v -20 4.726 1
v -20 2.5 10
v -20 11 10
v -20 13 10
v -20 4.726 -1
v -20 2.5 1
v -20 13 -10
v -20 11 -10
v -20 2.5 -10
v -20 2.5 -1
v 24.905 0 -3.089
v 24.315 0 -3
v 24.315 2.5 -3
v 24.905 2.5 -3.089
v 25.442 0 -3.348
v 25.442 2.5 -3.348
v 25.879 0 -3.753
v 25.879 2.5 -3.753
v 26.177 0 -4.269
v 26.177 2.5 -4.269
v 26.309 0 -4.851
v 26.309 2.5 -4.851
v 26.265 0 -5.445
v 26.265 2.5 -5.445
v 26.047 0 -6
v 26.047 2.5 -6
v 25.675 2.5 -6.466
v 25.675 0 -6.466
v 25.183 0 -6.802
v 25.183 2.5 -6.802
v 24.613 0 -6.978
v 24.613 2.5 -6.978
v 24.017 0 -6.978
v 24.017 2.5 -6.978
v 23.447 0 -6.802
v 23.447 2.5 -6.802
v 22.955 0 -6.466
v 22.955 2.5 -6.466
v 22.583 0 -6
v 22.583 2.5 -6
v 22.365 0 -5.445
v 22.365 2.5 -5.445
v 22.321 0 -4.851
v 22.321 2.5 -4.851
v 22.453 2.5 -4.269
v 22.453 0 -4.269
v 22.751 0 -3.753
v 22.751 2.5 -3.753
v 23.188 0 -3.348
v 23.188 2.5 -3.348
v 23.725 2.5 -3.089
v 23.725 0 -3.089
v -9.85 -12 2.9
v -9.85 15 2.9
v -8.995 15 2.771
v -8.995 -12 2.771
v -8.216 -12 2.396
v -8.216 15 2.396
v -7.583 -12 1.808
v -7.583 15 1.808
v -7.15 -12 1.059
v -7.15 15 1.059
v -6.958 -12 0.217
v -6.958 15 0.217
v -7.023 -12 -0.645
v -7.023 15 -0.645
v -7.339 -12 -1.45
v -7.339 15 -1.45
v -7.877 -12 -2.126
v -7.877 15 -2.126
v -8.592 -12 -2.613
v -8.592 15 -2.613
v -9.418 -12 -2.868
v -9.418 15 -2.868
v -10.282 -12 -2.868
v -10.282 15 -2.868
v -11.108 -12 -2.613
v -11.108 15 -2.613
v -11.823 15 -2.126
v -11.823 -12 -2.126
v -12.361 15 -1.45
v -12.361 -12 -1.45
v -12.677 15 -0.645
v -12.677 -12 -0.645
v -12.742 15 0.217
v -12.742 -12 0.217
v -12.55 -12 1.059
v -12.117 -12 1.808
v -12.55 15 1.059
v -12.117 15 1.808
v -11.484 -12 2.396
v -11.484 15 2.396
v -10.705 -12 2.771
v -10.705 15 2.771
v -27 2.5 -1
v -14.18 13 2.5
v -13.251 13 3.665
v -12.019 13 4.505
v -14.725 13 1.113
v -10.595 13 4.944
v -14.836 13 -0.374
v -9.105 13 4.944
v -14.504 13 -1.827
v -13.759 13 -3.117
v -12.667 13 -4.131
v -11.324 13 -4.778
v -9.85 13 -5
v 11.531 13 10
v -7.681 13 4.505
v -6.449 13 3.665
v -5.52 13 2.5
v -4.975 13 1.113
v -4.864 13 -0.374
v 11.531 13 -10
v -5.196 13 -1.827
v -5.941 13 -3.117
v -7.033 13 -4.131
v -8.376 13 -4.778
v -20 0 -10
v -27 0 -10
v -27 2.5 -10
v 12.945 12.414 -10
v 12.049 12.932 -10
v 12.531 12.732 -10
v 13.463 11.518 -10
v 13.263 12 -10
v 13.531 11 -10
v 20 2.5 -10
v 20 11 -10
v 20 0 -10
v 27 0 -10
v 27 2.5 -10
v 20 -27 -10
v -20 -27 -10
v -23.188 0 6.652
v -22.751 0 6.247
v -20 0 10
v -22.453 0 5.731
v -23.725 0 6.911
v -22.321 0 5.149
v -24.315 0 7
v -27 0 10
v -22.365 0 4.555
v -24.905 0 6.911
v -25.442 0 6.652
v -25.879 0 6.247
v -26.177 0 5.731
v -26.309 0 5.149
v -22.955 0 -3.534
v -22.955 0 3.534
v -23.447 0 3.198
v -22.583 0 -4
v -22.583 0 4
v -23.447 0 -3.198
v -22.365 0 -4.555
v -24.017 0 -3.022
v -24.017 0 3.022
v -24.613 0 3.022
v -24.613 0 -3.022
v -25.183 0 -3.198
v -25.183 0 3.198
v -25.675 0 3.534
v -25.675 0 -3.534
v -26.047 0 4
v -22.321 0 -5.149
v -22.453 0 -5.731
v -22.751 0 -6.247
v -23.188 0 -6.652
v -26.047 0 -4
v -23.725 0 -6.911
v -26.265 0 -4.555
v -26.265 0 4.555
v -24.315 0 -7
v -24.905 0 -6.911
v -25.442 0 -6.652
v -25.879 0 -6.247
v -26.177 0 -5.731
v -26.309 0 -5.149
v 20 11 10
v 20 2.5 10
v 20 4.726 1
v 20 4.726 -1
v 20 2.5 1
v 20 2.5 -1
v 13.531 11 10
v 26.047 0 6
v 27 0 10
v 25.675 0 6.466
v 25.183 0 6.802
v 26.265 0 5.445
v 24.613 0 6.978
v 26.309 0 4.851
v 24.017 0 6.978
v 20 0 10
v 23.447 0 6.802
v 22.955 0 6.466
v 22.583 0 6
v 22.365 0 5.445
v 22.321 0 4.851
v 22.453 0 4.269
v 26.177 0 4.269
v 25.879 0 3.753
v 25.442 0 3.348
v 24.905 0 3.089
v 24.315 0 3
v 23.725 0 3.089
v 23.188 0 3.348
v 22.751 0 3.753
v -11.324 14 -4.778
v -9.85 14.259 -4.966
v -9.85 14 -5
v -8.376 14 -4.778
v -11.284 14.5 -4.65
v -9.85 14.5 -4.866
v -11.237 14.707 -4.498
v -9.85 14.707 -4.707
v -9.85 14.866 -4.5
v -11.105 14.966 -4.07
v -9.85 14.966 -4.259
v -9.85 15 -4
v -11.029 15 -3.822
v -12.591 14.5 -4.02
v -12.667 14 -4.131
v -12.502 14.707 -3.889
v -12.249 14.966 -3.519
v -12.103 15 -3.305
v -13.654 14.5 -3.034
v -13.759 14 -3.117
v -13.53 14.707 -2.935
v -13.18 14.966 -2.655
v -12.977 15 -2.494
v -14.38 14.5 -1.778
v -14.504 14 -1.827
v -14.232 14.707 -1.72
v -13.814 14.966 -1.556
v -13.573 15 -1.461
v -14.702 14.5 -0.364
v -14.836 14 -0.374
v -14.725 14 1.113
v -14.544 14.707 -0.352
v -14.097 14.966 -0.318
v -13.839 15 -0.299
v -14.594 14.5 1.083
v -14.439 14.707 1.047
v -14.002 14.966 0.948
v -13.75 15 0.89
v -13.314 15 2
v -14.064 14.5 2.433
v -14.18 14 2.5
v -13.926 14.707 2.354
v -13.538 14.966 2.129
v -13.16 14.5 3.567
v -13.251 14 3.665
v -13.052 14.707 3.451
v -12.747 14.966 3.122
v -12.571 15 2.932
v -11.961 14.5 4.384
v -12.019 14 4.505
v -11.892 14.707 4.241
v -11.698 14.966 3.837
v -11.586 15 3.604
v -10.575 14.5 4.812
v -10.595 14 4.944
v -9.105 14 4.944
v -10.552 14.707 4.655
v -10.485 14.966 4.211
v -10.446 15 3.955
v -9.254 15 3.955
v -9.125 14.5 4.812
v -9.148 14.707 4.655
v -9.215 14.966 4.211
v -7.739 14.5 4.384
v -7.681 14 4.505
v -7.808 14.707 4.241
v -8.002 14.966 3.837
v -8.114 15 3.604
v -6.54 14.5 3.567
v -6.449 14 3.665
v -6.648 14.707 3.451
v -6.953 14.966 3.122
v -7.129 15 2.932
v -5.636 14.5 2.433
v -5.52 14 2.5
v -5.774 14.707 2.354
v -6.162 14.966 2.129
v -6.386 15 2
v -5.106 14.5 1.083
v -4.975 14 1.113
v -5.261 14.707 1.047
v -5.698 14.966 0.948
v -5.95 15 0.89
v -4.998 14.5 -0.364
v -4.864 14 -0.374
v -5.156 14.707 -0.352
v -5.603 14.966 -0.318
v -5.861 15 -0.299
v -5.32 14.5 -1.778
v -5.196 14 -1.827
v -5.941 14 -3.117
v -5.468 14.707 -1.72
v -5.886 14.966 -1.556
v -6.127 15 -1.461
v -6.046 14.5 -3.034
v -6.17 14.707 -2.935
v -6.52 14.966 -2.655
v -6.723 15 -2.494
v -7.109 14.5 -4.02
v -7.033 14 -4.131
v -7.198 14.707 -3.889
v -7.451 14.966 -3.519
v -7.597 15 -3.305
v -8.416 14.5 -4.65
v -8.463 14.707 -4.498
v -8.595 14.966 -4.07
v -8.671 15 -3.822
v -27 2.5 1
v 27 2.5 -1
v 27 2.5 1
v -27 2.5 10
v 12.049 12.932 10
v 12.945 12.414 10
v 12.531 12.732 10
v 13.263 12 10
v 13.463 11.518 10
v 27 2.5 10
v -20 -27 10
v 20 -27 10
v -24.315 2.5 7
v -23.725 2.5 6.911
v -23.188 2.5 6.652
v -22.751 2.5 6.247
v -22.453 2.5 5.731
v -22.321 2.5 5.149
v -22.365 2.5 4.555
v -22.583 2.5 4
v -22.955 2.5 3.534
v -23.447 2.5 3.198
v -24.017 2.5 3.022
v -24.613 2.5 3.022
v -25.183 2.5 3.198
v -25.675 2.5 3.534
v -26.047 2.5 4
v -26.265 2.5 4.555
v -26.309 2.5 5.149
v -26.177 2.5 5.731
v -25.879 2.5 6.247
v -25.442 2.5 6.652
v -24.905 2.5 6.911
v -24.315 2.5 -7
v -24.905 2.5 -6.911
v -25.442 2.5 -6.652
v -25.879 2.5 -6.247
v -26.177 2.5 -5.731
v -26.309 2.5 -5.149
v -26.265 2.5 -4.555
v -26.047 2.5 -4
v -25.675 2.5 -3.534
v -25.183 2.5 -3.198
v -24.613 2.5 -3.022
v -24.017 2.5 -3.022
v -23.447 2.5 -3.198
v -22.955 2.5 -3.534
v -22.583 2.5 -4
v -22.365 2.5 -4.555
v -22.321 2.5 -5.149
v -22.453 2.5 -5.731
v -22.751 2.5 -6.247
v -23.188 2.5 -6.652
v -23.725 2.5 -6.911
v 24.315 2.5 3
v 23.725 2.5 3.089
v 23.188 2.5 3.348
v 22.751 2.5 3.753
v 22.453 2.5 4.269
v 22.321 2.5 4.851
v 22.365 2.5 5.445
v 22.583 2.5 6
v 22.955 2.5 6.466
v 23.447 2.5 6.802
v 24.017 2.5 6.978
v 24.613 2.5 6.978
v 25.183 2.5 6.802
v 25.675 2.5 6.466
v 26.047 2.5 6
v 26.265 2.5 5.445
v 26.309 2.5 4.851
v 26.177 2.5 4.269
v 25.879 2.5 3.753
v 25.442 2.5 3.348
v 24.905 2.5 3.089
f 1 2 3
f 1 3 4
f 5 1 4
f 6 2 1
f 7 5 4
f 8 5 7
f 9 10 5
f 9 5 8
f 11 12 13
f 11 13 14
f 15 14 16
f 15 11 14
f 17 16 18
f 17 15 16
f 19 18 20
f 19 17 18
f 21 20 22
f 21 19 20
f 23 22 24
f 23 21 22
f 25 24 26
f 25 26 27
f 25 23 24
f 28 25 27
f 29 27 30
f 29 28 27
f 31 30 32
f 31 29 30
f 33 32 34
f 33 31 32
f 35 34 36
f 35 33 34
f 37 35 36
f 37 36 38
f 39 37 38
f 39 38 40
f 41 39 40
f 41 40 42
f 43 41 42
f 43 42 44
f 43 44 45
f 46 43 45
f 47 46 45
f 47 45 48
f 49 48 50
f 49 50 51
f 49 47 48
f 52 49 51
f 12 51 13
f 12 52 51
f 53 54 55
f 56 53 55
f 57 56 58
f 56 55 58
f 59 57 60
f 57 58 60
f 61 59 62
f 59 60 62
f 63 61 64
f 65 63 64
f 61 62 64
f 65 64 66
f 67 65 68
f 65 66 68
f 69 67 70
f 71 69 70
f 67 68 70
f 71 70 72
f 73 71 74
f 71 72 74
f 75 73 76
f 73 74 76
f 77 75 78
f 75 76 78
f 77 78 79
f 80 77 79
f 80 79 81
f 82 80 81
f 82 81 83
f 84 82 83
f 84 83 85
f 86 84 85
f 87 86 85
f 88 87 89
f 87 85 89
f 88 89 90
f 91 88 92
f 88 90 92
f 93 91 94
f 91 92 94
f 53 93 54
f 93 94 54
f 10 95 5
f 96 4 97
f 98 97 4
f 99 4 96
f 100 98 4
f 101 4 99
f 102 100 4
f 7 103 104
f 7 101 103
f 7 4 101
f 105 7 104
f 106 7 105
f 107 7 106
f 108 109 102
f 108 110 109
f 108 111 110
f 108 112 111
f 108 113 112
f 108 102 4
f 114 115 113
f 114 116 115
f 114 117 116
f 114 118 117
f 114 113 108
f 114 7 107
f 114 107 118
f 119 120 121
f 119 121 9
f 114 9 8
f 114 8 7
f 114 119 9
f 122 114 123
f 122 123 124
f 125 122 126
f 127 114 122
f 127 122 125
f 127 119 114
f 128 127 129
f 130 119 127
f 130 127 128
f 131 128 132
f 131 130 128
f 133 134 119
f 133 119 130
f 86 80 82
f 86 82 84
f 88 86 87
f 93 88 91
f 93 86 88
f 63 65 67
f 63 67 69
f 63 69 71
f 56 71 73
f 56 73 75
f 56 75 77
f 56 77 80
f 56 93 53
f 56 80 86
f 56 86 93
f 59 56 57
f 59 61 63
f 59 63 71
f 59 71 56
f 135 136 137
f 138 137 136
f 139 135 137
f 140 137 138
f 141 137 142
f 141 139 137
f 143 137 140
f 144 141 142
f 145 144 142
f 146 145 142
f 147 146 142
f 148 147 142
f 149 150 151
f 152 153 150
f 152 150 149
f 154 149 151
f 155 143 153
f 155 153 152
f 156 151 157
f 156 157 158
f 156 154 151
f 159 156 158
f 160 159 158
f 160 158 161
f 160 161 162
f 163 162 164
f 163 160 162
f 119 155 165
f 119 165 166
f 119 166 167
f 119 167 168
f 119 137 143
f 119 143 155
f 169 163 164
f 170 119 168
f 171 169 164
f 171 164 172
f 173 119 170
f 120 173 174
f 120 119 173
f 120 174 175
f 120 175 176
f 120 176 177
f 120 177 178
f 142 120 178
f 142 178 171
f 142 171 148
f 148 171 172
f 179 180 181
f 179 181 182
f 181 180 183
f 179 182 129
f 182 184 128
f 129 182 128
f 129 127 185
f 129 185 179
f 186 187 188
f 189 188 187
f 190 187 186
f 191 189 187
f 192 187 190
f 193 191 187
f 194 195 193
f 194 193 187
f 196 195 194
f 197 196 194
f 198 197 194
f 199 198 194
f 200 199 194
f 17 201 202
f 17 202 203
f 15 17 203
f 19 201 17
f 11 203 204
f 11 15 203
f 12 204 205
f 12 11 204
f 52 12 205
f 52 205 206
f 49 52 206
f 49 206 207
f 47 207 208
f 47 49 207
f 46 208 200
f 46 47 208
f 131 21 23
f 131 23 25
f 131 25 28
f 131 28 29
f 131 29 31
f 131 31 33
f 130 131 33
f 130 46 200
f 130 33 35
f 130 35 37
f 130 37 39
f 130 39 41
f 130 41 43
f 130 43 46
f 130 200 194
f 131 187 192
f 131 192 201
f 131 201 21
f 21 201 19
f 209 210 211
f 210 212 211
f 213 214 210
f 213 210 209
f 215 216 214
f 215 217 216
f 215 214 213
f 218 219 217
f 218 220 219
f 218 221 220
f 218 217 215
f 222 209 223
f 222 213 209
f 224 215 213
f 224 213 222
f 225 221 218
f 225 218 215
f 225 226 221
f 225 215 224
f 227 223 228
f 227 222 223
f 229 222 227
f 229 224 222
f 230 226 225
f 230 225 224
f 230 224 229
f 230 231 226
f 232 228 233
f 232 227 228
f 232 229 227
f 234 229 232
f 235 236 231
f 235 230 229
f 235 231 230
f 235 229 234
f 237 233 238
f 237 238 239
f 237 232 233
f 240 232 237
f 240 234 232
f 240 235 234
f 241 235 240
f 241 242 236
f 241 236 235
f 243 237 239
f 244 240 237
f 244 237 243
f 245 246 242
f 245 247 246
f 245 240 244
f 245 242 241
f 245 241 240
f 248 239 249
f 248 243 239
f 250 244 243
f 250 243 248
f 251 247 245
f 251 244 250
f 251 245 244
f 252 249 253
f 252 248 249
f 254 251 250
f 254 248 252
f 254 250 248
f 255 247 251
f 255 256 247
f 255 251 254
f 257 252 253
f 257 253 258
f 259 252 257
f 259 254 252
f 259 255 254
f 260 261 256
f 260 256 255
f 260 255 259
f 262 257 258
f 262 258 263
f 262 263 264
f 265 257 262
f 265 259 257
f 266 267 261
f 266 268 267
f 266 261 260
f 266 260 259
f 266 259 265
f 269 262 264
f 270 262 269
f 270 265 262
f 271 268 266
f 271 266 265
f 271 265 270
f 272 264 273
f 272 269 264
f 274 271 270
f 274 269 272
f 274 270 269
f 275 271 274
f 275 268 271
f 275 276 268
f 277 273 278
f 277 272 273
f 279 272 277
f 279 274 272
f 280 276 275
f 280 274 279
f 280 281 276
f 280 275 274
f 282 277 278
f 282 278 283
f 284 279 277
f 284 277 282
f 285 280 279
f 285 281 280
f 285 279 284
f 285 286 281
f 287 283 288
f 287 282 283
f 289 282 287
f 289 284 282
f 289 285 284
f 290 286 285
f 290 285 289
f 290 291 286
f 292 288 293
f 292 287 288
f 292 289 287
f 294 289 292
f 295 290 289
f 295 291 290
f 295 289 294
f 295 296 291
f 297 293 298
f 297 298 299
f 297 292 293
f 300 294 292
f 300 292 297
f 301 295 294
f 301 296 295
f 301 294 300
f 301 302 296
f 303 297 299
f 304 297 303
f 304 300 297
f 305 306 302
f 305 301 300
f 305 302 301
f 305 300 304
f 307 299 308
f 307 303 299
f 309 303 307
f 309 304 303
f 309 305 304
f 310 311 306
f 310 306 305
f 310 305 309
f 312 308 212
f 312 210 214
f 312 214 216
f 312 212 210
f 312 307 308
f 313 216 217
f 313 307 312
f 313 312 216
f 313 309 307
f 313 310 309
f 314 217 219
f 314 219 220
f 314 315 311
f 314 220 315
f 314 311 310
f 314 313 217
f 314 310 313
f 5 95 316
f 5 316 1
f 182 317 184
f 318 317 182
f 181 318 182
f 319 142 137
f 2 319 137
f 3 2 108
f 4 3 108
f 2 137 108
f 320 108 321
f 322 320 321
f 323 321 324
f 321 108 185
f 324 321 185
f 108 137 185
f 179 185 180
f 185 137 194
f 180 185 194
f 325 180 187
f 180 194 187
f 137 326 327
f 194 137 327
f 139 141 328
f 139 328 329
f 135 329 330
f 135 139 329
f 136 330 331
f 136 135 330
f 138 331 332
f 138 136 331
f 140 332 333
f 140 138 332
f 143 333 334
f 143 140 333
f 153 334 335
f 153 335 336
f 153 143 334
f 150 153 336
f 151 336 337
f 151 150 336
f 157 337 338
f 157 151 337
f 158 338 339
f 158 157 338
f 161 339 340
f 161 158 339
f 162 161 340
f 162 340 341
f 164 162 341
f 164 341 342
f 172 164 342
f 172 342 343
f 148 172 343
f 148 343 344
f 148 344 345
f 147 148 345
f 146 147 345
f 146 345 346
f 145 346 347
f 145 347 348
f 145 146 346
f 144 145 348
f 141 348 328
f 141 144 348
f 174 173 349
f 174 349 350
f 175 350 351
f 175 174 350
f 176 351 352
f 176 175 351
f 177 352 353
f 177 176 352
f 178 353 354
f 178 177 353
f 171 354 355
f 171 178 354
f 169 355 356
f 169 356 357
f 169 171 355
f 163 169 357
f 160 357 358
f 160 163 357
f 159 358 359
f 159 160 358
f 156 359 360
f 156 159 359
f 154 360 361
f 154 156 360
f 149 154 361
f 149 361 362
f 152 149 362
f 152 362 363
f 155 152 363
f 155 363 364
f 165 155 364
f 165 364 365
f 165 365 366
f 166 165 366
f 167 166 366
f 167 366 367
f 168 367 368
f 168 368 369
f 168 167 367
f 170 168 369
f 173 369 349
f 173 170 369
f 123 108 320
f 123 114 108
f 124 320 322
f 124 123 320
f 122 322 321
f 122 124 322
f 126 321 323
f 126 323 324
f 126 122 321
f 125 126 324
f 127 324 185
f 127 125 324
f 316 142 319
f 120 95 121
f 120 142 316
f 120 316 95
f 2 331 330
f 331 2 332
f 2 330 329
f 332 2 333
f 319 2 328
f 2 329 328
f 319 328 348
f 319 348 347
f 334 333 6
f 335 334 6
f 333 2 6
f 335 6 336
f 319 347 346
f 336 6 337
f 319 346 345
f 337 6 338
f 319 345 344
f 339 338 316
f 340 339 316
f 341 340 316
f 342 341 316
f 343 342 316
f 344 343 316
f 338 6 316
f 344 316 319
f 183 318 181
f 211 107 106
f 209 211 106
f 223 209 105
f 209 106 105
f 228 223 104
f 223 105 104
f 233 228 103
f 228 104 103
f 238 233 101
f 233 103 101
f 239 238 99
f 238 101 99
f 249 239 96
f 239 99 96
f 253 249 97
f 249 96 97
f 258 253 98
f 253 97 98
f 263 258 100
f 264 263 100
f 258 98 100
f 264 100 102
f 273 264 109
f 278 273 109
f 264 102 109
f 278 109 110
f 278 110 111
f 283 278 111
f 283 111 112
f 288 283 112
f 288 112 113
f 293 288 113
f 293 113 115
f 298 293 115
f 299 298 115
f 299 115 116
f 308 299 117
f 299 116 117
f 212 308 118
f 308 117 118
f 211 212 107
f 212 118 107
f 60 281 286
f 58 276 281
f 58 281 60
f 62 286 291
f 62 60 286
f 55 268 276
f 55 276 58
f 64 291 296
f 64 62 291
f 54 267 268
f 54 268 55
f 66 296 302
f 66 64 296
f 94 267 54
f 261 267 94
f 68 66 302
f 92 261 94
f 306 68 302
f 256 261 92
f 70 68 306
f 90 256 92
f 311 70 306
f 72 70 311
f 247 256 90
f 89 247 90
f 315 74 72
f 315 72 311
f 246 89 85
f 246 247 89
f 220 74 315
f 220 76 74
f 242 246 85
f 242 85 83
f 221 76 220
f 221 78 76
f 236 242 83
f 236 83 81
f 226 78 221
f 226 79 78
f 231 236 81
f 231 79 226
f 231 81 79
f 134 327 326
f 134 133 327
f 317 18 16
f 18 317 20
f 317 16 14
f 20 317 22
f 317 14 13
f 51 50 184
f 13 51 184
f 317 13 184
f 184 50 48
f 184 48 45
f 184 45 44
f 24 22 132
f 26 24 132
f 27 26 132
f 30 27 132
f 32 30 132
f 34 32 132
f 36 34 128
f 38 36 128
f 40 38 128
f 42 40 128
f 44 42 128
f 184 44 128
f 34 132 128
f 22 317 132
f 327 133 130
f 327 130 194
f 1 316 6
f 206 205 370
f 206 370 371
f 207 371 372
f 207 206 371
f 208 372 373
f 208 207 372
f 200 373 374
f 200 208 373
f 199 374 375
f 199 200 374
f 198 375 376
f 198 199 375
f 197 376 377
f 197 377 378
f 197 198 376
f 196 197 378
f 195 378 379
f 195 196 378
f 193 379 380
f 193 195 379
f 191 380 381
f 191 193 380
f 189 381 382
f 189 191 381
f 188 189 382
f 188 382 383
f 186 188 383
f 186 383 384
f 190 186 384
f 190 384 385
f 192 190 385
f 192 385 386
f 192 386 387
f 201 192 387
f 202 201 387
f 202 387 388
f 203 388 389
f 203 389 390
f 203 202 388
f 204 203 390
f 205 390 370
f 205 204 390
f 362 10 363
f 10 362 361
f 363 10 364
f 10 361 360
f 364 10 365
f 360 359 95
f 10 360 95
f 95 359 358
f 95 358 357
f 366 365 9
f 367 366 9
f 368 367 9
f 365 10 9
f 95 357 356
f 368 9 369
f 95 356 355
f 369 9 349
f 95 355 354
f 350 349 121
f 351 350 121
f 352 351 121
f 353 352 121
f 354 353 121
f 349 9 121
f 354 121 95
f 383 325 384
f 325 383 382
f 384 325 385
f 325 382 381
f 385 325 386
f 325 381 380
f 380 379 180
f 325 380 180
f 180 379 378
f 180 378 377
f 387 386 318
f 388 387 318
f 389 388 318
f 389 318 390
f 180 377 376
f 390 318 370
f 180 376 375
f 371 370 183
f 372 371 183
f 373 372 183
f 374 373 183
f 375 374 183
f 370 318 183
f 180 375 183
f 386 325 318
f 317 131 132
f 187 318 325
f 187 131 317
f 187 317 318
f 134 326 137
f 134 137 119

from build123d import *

# Parameters (mm, degrees)
EXTRUDE_1_DEPTH     = 27
SKETCH_3_R          = 2
EXTRUDE_2_DEPTH     = 2.5
EXTRUDE_3_DEPTH     = 8.5
SKETCH_5_W          = 33.531111889
SKETCH_5_H          = 20
EXTRUDE_4_DEPTH     = 2
FILLET_5_R          = 2
SKETCH_6_R          = 5
EXTRUDE_5_DEPTH     = 2
FILLET_7_R          = 1
SKETCH_7_R          = 2.9
CUT_EXTRUDE_1_DEPTH = 27
RIB_8_REACH         = 41.472
SKETCH_8_WALL_W     = 88.288518024
SKETCH_8_WALL_H     = 2


with BuildPart() as part:
    # 草图2 → 凸台-拉伸1 (new body)
    with BuildSketch(Plane(origin=(0, 0, 0), x_dir=(1, 0, 0), z_dir=(0, 1, 0))):
        Polygon((0, -10), (-20, -10), (-20, 10), (20, 10), (20, -10), align=None)
    extrude(amount=-EXTRUDE_1_DEPTH)

    # 草图3 → 凸台-拉伸2 (add)
    with BuildSketch(Plane(origin=(0, 0, 0), x_dir=(1, 0, 0), z_dir=(0, 1, 0))):
        Polygon((0, 10), (27, 10), (27, -10), (-27, -10), (-27, 10), align=None)
        with Locations(Location((-24.315, -5, 0), (0, 0, 270))):
            Circle(SKETCH_3_R, mode=Mode.SUBTRACT)
        with Locations(Location((-24.315, 5, 0), (0, 0, 90))):
            Circle(SKETCH_3_R, mode=Mode.SUBTRACT)
        with Locations(Location((24.315, -5, 0), (0, 0, 90))):
            Circle(SKETCH_3_R, mode=Mode.SUBTRACT)
        with Locations(Location((24.315, 5, 0), (0, 0, 270))):
            Circle(SKETCH_3_R, mode=Mode.SUBTRACT)
    extrude(amount=EXTRUDE_2_DEPTH)

    # 草图4 → 凸台-拉伸3 (add)
    with BuildSketch(Plane(origin=(0, 2.5, 0), x_dir=(1, 0, 0), z_dir=(0, 1, 0))):
        Polygon((0, 10), (-20, 10), (-20, -10), (20, -10), (20, 10), align=None)
    extrude(amount=EXTRUDE_3_DEPTH)

    # 草图5 → 凸台-拉伸4 (add)
    with BuildSketch(Plane(origin=(0, 11, 0), x_dir=(1, 0, 0), z_dir=(0, 1, 0))):
        with Locations((-3.234444055, 0)):
            Rectangle(SKETCH_5_W, SKETCH_5_H)
    extrude(amount=EXTRUDE_4_DEPTH)

    # 圆角5
    fillet_5_edges = [part.edges().sort_by_distance(p)[0] for p in [
        (13.531111889, 13, 0),
    ]]
    fillet(fillet_5_edges, radius=FILLET_5_R - 0.0001)  # a hair under: the kernel refuses the full size

    # 草图6 → 凸台-拉伸5 (add)
    with BuildSketch(Plane(origin=(0, 13, 0), x_dir=(1, 0, 0), z_dir=(0, 1, 0))):
        with Locations(Location((-9.85, 0, 0), (0, 0, 90))):
            Circle(SKETCH_6_R)
    extrude(amount=EXTRUDE_5_DEPTH)

    # 圆角7
    fillet_7_edges = [part.edges().sort_by_distance(p)[0] for p in [
        (-9.85, 15, 5),
    ]]
    fillet(fillet_7_edges, radius=FILLET_7_R)

    # 草图7 → 切除-拉伸1 (cut)
    with BuildSketch(Plane(origin=(0, 15, 0), x_dir=(1, 0, 0), z_dir=(0, 1, 0))):
        with Locations(Location((-9.85, 0, 0), (0, 0, 270))):
            Circle(SKETCH_7_R)
    extrude(amount=-CUT_EXTRUDE_1_DEPTH, mode=Mode.SUBTRACT)

    # 草图8 wall → 筋8 (add, up to next)
    with BuildSketch(Plane(origin=(-23.5, 3.613146338, 0), x_dir=(0.952964322003, 0.303082498652, 0), z_dir=(-0.303082498652, 0.952964322003, 0)), mode=Mode.PRIVATE) as rib_8_sk1:
        Rectangle(SKETCH_8_WALL_W, SKETCH_8_WALL_H)
    rib_8_tool1 = extrude(rib_8_sk1.sketch, amount=-RIB_8_REACH, mode=Mode.PRIVATE) - part.part
    rib_8 = rib_8_tool1.solids().sort_by_distance((-23.5, 3.613146338, 0))[0]
    add(rib_8)

    # 镜向1: 筋8 across plane
    add(rib_8.mirror(Plane(origin=(0, 0, 0), x_dir=(0, 0, 1), z_dir=(1, 0, 0))))


solid = part.part
